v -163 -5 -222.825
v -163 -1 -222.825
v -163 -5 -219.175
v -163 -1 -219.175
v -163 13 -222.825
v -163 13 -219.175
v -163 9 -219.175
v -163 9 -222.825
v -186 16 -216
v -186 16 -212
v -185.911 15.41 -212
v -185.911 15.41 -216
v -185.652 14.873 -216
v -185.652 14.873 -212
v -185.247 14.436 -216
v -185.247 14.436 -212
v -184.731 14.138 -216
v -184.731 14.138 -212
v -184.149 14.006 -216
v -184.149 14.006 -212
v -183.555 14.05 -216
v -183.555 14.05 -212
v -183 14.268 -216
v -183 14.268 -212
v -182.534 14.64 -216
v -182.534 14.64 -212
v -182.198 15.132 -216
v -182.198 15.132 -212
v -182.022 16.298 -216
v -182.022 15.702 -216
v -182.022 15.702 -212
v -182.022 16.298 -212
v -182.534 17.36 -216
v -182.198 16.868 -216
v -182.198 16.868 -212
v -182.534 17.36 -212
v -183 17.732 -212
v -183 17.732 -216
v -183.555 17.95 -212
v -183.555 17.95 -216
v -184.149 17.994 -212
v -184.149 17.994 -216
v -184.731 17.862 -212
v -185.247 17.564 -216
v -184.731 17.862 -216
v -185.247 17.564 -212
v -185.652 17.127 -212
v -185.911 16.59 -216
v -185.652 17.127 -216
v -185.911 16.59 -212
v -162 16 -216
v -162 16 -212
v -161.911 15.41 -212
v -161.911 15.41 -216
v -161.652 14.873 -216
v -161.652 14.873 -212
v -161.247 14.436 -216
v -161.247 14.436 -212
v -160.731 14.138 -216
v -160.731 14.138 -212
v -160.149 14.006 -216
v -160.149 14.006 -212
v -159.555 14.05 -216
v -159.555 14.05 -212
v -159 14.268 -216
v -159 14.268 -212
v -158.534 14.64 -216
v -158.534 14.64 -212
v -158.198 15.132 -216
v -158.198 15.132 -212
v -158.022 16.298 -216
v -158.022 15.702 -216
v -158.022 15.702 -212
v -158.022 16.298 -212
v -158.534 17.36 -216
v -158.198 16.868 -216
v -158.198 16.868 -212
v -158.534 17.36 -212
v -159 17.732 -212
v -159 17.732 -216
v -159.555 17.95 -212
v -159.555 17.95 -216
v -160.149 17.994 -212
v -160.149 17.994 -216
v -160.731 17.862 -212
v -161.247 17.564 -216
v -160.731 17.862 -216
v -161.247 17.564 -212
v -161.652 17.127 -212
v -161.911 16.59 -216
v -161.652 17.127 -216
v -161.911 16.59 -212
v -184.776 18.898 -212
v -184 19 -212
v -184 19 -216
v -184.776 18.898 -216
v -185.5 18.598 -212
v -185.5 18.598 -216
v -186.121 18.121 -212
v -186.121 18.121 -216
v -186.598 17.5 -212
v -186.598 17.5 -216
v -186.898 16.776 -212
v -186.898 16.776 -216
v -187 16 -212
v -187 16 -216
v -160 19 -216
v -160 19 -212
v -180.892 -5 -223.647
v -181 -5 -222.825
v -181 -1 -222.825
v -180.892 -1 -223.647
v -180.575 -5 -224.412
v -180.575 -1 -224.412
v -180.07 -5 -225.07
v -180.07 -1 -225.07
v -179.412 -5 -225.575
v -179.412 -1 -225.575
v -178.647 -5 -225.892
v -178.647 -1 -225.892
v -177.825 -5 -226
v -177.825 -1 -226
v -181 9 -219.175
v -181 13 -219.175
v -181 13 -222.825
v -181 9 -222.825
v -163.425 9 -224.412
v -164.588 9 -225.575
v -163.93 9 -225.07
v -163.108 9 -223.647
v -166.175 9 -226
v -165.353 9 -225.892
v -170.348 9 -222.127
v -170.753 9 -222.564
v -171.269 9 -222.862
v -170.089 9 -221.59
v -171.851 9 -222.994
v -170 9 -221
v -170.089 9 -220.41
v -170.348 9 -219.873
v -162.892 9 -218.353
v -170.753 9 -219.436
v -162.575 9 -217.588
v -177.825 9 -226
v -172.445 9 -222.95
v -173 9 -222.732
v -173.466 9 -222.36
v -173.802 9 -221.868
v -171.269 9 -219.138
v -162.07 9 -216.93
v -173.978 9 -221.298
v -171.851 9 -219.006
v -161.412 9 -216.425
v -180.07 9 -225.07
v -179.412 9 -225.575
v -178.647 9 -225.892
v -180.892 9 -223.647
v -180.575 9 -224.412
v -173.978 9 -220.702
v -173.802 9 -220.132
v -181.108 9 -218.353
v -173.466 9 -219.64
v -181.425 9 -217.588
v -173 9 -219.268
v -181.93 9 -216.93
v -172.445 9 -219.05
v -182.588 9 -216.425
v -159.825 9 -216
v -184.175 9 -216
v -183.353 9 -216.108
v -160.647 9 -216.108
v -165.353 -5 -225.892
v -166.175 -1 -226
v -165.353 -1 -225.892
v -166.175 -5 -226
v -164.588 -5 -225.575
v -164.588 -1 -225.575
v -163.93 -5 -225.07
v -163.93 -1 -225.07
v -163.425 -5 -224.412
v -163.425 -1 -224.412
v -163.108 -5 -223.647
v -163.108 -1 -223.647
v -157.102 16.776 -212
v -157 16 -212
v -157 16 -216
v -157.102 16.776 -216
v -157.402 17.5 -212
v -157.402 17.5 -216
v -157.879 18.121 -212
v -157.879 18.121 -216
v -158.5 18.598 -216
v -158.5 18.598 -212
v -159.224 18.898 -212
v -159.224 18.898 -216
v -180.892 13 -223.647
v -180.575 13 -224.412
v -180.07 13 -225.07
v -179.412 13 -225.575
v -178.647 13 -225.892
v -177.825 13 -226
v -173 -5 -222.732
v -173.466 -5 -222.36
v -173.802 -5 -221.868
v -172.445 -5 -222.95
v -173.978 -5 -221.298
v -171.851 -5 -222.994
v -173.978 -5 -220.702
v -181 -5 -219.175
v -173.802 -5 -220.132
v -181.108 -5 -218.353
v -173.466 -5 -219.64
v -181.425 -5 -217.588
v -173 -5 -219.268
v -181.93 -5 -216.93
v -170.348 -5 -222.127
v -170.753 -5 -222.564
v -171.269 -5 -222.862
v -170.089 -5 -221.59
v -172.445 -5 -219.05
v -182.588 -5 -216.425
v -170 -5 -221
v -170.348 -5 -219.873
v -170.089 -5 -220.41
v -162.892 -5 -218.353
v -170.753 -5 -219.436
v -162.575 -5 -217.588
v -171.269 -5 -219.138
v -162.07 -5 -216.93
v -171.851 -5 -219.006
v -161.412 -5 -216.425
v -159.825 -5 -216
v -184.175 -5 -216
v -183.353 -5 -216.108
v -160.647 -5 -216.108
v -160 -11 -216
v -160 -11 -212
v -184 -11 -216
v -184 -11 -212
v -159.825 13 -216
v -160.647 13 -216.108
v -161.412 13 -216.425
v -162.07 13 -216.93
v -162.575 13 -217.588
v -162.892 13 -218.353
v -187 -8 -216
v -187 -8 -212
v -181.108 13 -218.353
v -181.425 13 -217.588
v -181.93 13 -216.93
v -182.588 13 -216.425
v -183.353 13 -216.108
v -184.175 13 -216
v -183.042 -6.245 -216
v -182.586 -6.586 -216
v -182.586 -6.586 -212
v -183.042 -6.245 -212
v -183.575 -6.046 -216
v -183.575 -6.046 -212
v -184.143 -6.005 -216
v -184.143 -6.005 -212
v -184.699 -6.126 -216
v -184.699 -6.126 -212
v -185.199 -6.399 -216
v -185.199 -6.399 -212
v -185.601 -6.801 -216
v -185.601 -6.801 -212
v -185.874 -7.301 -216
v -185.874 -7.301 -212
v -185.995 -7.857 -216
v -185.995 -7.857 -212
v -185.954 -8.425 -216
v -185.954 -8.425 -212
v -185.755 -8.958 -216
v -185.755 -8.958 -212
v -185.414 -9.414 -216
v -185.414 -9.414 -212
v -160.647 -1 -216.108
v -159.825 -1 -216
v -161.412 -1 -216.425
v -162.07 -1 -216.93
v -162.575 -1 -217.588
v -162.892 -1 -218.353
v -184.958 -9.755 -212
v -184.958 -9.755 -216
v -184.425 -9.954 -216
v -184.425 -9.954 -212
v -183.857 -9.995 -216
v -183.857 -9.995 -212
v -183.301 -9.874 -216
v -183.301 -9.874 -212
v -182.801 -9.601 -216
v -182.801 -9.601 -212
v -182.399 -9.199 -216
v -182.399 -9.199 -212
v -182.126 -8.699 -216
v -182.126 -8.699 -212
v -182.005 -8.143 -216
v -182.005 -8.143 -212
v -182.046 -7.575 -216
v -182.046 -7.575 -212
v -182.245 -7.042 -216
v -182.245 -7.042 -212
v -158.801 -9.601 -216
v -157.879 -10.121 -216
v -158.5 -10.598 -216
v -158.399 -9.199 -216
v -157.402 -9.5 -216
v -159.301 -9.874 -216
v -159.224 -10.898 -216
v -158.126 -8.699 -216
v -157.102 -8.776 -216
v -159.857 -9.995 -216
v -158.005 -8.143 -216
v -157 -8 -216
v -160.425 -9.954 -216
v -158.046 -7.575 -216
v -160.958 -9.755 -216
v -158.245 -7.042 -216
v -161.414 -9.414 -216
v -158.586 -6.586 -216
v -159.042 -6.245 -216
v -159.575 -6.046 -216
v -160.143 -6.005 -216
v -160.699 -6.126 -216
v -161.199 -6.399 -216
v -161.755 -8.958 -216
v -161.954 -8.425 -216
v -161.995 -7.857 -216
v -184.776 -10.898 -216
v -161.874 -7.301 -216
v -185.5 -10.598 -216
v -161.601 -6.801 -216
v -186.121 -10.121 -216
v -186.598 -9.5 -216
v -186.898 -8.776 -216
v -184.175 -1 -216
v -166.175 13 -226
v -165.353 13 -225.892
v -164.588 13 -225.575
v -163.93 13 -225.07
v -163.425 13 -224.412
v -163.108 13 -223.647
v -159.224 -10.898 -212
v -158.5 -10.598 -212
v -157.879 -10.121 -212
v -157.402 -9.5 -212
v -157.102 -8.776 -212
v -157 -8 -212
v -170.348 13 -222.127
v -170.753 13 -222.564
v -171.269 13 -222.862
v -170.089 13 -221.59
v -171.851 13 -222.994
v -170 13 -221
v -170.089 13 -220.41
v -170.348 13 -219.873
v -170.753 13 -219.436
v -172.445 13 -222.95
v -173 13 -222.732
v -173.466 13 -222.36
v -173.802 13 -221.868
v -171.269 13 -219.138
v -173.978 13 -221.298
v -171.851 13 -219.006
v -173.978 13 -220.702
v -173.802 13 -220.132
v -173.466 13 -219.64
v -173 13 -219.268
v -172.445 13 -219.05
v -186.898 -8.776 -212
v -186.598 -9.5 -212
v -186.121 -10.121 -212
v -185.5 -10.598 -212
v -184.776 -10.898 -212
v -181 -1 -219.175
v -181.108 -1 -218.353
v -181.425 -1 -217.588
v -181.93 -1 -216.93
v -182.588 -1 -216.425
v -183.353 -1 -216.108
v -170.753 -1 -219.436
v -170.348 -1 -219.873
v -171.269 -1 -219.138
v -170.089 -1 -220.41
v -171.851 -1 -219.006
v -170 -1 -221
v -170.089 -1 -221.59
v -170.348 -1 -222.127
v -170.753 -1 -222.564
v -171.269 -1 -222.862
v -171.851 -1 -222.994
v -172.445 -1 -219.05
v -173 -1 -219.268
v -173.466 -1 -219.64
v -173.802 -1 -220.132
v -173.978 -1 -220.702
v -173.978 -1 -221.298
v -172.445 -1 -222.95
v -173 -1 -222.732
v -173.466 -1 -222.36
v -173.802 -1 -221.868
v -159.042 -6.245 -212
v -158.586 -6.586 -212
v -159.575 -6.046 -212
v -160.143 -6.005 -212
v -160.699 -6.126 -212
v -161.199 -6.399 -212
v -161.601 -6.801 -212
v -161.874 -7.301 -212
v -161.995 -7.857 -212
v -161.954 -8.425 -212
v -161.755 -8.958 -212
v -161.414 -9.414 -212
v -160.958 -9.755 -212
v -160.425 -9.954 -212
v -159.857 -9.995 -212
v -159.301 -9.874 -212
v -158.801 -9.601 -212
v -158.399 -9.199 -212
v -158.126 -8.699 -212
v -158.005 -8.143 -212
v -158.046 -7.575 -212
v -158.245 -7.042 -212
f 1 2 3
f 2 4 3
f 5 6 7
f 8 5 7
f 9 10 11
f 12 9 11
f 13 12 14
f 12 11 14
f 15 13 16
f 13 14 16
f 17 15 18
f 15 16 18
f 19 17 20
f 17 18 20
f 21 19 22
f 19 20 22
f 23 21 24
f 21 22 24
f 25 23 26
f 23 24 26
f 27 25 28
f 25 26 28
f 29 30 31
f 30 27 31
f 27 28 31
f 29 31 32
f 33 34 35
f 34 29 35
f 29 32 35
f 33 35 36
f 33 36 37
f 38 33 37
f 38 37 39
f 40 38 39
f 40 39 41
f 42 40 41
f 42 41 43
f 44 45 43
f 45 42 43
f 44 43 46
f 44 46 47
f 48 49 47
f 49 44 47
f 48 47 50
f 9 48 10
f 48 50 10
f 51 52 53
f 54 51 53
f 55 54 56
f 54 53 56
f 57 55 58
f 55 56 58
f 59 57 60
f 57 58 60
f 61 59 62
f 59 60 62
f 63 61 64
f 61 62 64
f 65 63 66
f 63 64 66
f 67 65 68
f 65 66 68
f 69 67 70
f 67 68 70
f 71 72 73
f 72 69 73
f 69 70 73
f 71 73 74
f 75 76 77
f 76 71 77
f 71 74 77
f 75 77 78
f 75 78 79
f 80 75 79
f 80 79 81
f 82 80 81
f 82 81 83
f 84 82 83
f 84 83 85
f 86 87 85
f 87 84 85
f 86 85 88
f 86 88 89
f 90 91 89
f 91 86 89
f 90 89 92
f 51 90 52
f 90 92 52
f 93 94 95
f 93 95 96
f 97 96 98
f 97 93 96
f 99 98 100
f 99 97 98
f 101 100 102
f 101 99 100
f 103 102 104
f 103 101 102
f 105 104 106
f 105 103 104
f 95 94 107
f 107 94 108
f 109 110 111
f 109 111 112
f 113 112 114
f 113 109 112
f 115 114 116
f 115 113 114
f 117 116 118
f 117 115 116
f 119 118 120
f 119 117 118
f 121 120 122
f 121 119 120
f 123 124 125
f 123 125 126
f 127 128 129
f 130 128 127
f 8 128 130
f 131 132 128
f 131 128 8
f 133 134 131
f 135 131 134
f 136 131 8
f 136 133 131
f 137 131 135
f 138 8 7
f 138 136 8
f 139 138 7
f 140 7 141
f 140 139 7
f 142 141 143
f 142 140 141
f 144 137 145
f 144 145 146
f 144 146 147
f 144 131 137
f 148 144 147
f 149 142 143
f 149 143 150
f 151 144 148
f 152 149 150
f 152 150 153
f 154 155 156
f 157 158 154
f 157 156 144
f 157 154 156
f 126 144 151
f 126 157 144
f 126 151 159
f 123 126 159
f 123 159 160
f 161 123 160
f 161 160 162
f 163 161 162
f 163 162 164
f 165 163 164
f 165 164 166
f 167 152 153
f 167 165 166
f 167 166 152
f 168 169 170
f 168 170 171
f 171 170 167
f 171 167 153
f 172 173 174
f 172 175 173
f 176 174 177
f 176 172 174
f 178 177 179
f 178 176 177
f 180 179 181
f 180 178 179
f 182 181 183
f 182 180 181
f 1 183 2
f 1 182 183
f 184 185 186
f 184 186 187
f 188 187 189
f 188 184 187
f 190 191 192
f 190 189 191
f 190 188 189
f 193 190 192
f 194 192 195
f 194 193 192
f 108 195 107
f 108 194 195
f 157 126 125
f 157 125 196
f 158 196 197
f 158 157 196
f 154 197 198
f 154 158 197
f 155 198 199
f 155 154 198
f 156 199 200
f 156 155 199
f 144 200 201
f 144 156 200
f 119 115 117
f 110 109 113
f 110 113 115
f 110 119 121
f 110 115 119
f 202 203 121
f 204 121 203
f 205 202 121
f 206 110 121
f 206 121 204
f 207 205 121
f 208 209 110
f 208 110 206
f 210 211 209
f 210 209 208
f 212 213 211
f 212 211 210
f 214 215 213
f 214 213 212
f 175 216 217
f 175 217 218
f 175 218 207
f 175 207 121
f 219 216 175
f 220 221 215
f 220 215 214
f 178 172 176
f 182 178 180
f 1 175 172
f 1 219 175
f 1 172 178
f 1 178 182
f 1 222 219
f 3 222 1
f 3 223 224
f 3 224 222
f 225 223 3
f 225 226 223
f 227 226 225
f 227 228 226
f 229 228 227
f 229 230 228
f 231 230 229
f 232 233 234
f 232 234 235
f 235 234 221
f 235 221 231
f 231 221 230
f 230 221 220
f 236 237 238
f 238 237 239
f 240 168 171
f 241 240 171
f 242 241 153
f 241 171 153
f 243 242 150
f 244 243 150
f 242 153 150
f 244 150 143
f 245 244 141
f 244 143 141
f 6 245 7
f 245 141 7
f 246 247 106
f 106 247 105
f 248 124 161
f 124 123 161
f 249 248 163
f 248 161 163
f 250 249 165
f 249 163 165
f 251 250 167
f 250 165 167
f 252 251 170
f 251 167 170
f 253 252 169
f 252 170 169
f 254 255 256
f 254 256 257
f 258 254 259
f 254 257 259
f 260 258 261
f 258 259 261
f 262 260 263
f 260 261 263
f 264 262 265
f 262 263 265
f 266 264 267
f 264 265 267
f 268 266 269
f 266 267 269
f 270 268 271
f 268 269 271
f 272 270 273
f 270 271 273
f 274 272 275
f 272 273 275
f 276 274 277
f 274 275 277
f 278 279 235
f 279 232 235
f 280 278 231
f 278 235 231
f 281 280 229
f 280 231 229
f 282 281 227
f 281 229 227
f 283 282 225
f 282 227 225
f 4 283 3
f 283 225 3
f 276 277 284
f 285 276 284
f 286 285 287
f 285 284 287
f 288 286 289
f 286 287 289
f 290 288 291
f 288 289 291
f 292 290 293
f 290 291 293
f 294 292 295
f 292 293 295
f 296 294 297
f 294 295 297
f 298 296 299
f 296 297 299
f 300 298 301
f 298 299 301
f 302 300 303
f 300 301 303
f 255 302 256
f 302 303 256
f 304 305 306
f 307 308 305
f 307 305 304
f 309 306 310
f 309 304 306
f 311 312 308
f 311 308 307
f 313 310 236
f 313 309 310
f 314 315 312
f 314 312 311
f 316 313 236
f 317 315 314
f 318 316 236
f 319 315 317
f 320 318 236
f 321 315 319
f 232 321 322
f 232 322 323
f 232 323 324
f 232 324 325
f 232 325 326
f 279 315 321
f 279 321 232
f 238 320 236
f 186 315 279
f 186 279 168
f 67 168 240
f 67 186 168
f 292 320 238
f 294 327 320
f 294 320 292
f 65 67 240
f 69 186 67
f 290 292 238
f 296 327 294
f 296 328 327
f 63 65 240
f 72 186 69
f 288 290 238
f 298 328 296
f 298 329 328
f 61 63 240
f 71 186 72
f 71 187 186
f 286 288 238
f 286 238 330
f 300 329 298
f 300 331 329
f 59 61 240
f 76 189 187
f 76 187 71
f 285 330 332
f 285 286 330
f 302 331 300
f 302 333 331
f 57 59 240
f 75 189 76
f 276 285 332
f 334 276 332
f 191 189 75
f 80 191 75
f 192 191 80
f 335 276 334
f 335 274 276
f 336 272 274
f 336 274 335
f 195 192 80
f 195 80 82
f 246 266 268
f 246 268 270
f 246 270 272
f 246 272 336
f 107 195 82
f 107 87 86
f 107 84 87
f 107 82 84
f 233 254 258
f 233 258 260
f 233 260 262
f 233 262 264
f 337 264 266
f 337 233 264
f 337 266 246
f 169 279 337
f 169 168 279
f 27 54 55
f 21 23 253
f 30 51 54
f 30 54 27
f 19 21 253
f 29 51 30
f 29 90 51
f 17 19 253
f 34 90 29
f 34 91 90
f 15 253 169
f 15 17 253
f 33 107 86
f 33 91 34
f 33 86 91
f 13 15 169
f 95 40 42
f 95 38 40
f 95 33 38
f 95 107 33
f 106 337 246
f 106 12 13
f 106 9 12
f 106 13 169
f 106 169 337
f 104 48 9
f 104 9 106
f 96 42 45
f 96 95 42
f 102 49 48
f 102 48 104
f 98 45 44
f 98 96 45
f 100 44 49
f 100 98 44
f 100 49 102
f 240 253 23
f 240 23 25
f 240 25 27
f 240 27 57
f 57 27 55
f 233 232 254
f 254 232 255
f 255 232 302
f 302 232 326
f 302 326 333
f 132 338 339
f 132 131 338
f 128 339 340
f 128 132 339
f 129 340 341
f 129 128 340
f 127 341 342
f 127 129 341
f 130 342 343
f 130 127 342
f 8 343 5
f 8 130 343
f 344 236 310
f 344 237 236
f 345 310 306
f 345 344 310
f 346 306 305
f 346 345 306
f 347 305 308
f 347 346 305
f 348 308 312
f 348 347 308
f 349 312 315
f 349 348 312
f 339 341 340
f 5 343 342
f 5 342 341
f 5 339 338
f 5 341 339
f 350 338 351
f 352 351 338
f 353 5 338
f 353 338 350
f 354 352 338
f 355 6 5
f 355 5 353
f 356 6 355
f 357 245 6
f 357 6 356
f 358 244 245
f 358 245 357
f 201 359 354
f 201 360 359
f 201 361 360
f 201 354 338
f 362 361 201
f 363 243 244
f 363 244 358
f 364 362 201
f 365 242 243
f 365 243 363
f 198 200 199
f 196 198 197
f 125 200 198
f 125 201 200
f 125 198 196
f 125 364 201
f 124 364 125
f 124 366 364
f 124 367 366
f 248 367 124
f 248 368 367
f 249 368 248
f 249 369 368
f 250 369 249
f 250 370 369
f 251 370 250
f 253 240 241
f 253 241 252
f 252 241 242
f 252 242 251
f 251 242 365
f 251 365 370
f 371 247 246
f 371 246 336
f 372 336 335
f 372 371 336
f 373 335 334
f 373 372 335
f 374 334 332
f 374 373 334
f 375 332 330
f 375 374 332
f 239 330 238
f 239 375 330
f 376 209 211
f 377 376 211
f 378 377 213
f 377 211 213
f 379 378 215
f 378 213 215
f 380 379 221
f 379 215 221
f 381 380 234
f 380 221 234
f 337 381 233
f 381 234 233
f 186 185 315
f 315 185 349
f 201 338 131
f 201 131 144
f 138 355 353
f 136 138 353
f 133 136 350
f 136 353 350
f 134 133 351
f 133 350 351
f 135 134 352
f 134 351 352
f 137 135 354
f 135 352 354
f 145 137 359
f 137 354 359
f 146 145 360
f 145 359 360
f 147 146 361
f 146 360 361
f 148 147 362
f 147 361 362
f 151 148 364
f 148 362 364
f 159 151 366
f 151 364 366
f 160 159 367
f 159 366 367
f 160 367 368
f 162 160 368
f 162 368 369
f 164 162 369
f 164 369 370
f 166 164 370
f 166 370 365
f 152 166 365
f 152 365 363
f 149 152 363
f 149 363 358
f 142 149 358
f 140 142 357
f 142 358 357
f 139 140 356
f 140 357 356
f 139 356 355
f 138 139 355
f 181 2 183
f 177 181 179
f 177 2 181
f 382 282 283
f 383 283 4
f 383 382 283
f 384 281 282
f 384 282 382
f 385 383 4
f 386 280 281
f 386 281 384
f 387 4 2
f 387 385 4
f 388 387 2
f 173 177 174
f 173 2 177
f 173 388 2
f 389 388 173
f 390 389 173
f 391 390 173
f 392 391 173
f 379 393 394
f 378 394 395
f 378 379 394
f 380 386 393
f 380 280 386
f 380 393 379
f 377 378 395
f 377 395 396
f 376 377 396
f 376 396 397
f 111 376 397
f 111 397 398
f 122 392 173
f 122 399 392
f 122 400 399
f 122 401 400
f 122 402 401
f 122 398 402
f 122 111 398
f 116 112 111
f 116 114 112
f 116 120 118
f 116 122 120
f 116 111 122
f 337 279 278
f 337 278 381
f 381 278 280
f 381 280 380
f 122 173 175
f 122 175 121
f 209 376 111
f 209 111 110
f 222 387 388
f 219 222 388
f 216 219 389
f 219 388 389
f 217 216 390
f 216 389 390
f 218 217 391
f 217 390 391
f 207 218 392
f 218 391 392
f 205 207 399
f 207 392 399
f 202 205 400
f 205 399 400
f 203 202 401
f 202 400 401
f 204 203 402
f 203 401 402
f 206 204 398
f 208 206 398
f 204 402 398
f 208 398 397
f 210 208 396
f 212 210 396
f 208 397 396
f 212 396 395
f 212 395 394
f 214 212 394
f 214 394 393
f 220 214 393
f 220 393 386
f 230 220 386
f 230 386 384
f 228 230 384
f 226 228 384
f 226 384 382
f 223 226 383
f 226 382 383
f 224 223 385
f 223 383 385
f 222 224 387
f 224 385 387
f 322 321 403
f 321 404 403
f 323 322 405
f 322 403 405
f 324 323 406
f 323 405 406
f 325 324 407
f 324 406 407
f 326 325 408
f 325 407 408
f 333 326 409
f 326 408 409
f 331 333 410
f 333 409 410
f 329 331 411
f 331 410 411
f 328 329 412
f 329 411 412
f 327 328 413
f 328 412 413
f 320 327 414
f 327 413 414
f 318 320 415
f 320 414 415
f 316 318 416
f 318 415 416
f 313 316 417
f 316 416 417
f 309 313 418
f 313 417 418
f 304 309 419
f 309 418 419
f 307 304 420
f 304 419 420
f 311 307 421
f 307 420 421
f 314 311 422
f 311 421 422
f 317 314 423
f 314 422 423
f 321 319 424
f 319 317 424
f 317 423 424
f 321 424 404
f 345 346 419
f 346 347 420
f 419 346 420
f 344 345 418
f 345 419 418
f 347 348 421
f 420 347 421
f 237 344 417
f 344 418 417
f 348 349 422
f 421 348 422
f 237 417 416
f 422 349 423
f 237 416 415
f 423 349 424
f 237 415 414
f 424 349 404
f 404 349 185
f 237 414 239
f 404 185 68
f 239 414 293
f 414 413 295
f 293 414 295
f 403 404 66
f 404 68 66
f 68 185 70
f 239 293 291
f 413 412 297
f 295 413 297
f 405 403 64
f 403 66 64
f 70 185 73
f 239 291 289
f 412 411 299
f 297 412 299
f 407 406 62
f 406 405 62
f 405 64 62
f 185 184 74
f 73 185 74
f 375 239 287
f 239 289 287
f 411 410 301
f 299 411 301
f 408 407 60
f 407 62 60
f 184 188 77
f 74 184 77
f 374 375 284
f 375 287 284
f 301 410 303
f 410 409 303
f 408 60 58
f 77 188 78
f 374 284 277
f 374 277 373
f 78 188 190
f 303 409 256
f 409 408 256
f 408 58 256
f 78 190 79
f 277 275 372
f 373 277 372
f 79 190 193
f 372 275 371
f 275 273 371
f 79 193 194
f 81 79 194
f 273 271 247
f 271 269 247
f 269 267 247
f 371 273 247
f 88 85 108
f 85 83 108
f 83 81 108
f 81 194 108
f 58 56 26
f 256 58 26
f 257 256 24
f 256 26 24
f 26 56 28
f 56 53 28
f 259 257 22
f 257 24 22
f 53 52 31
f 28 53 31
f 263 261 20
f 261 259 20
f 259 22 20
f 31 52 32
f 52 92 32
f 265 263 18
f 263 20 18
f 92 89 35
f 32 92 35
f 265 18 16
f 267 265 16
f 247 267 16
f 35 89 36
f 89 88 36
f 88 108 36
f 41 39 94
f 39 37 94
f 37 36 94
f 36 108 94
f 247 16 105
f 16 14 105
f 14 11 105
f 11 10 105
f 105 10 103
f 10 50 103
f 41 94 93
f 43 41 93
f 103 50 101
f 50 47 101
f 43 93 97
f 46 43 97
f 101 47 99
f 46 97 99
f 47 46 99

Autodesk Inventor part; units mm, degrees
ref_plane "YZ Plane" through (0, 0, 0) normal (1, 0, 0) x (0, 1, 0)
ref_plane "XZ Plane" through (0, 0, 0) normal (0, 1, 0) x (-1, 0, 0)
ref_plane "XY Plane" through (0, 0, 0) normal (0, 0, 1) x (1, 0, 0)
ref_plane "Work Plane1" through (-192, 24, -212) normal (0, 0, -1) x (-1, 0, 0)
sketch "Sketch1" plane through (-192, 24, -212) normal (0, 0, -1) x (-1, 0, 0)
  circle A0 centre (-32, -8) radius 2 projected
  arc A1 (-30.5858, -33.4142) -> (-33.4142, -30.5858) centre (-32, -32) ccw projected
  arc A2 (-6.5858, -33.4142) -> (-9.4142, -30.5858) centre (-8, -32) ccw projected
  circle A3 centre (-8, -8) radius 2 projected
  circle A4 centre (-32, -32) radius 2
  circle A5 centre (-8, -32) radius 2
  circle A6 centre (-8, -8) radius 2
  circle A7 centre (-32, -8) radius 2
  circle A8 centre (-32, -8) radius 3
  circle A9 centre (-8, -8) radius 3
  circle A10 centre (-8, -32) radius 3
  circle A11 centre (-32, -32) radius 3
  line L0 (-35, -8) -> (-35, -32)
  line L1 (-32, -35) -> (-8, -35)
  line L2 (-5, -32) -> (-5, -8)
  line L3 (-8, -5) -> (-32, -5)
  point P0 (-192, -24)
  point P1 (-9.4142, -30.5858)
  point P2 (-33.4142, -30.5858)
  dimension "d0" = 1
  dimension "d1" = 1
  dimension "d2" = 1
  dimension "d3" = 1
extrude "Extrusion1" add sketch "Sketch1" along normal blind 4
sketch "Sketch2" plane through (-192, 24, -216) normal (0, 0, -1) x (-1, 0, 0)
  line L0 (-35, -8) -> (-35, -32) projected
  line L1 (-5, -32) -> (-5, -8) projected
  line L2 (-5, -32) -> (-5, -8) projected
  line L3 (-35, -11) -> (-5, -11)
  line L4 (-5, -11) -> (-5, -29)
  line L5 (-5, -29) -> (-35, -29)
  line L6 (-35, -29) -> (-35, -11)
  circle A0 centre (-32, -8) radius 2 projected
  circle A1 centre (-8, -8) radius 2 projected
  circle A2 centre (-8, -32) radius 2 projected
  circle A3 centre (-32, -32) radius 2 projected
  line L7 (-29, -11) -> (-29, -29)
  line L8 (-11, -11) -> (-11, -29)
  point P0 (-192, -24)
  dimension "d6" = 3
  dimension "d7" = 3
  dimension "d8" = 3
  dimension "d9" = 3
extrude "Extrusion2" add sketch "Sketch2" along normal blind 10 contours L3 L8 L5 L7
sketch "Sketch3" plane through (-181, -5, -216) normal (-1, 0, 0) x (0, 0, 1)
  line L0 (0, 18) -> (0, 0) projected
  line L1 (0, 18) -> (-10, 18) projected
  line L2 (-10, 0) -> (-10, 18) projected
  line L3 (0, 0) -> (-10, 0) projected
  line L4 (-10, 18) -> (-10, 0) projected
  line L5 (0, 21) -> (0, -3) projected
  line L6 (-10, 14) -> (0, 14)
  line L7 (0, 14) -> (0, 4)
  line L8 (0, 4) -> (-10, 4)
  line L9 (-10, 4) -> (-10, 14)
  point P0 (216, 5)
  point P1 (-10, 4)
  point P2 (0, 4)
  point P3 (0, 14)
  dimension "d12" = 4
  dimension "d13" = 4
extrude "Extrusion3" cut sketch "Sketch3" against normal through all contours L0 L8 L2 L6
fillet "Fillet1" radius 3.175 8 edges at (-181, 11, -226) (-163, 11, -226) (-181, 11, -216) (-163, 11, -216) (-163, -3, -216) (-163, -3, -226) (-181, -3, -226) (-181, -3, -216)
sketch "Sketch4" plane through (-184.175, 13, -216) normal (0, 1, 0) x (1, 0, 0)
  arc A0 (21.175, 6.825) -> (18, 10) centre (18, 6.825) ccw projected
  line L0 (6.35, 10) -> (18, 10) projected
  arc A1 (6.35, 10) -> (3.175, 6.825) centre (6.35, 6.825) ccw projected
  line L1 (3.175, 3.175) -> (3.175, 6.825) projected
  arc A2 (0, 0) -> (3.175, 3.175) centre (0, 3.175) ccw projected
  line L2 (24.35, 0) -> (0, 0) projected
  arc A3 (21.175, 3.175) -> (24.35, 0) centre (24.35, 3.175) ccw projected
  line L3 (21.175, 3.175) -> (21.175, 6.825) projected
  circle A4 centre (12.175, 5) radius 2
  point P0 (184.175, -216)
  dimension "d17" = 4
  dimension "d18" = 18
  dimension "d19" = 9
  dimension "d20" = 10
  dimension "d21" = 5
extrude "Extrusion4" cut sketch "Sketch4" against normal through all contours A4
equation "\"d19\" = 0.5 * d18"
equation "\"d21\" = 0.5 * d20"
properties part number "hinge"
